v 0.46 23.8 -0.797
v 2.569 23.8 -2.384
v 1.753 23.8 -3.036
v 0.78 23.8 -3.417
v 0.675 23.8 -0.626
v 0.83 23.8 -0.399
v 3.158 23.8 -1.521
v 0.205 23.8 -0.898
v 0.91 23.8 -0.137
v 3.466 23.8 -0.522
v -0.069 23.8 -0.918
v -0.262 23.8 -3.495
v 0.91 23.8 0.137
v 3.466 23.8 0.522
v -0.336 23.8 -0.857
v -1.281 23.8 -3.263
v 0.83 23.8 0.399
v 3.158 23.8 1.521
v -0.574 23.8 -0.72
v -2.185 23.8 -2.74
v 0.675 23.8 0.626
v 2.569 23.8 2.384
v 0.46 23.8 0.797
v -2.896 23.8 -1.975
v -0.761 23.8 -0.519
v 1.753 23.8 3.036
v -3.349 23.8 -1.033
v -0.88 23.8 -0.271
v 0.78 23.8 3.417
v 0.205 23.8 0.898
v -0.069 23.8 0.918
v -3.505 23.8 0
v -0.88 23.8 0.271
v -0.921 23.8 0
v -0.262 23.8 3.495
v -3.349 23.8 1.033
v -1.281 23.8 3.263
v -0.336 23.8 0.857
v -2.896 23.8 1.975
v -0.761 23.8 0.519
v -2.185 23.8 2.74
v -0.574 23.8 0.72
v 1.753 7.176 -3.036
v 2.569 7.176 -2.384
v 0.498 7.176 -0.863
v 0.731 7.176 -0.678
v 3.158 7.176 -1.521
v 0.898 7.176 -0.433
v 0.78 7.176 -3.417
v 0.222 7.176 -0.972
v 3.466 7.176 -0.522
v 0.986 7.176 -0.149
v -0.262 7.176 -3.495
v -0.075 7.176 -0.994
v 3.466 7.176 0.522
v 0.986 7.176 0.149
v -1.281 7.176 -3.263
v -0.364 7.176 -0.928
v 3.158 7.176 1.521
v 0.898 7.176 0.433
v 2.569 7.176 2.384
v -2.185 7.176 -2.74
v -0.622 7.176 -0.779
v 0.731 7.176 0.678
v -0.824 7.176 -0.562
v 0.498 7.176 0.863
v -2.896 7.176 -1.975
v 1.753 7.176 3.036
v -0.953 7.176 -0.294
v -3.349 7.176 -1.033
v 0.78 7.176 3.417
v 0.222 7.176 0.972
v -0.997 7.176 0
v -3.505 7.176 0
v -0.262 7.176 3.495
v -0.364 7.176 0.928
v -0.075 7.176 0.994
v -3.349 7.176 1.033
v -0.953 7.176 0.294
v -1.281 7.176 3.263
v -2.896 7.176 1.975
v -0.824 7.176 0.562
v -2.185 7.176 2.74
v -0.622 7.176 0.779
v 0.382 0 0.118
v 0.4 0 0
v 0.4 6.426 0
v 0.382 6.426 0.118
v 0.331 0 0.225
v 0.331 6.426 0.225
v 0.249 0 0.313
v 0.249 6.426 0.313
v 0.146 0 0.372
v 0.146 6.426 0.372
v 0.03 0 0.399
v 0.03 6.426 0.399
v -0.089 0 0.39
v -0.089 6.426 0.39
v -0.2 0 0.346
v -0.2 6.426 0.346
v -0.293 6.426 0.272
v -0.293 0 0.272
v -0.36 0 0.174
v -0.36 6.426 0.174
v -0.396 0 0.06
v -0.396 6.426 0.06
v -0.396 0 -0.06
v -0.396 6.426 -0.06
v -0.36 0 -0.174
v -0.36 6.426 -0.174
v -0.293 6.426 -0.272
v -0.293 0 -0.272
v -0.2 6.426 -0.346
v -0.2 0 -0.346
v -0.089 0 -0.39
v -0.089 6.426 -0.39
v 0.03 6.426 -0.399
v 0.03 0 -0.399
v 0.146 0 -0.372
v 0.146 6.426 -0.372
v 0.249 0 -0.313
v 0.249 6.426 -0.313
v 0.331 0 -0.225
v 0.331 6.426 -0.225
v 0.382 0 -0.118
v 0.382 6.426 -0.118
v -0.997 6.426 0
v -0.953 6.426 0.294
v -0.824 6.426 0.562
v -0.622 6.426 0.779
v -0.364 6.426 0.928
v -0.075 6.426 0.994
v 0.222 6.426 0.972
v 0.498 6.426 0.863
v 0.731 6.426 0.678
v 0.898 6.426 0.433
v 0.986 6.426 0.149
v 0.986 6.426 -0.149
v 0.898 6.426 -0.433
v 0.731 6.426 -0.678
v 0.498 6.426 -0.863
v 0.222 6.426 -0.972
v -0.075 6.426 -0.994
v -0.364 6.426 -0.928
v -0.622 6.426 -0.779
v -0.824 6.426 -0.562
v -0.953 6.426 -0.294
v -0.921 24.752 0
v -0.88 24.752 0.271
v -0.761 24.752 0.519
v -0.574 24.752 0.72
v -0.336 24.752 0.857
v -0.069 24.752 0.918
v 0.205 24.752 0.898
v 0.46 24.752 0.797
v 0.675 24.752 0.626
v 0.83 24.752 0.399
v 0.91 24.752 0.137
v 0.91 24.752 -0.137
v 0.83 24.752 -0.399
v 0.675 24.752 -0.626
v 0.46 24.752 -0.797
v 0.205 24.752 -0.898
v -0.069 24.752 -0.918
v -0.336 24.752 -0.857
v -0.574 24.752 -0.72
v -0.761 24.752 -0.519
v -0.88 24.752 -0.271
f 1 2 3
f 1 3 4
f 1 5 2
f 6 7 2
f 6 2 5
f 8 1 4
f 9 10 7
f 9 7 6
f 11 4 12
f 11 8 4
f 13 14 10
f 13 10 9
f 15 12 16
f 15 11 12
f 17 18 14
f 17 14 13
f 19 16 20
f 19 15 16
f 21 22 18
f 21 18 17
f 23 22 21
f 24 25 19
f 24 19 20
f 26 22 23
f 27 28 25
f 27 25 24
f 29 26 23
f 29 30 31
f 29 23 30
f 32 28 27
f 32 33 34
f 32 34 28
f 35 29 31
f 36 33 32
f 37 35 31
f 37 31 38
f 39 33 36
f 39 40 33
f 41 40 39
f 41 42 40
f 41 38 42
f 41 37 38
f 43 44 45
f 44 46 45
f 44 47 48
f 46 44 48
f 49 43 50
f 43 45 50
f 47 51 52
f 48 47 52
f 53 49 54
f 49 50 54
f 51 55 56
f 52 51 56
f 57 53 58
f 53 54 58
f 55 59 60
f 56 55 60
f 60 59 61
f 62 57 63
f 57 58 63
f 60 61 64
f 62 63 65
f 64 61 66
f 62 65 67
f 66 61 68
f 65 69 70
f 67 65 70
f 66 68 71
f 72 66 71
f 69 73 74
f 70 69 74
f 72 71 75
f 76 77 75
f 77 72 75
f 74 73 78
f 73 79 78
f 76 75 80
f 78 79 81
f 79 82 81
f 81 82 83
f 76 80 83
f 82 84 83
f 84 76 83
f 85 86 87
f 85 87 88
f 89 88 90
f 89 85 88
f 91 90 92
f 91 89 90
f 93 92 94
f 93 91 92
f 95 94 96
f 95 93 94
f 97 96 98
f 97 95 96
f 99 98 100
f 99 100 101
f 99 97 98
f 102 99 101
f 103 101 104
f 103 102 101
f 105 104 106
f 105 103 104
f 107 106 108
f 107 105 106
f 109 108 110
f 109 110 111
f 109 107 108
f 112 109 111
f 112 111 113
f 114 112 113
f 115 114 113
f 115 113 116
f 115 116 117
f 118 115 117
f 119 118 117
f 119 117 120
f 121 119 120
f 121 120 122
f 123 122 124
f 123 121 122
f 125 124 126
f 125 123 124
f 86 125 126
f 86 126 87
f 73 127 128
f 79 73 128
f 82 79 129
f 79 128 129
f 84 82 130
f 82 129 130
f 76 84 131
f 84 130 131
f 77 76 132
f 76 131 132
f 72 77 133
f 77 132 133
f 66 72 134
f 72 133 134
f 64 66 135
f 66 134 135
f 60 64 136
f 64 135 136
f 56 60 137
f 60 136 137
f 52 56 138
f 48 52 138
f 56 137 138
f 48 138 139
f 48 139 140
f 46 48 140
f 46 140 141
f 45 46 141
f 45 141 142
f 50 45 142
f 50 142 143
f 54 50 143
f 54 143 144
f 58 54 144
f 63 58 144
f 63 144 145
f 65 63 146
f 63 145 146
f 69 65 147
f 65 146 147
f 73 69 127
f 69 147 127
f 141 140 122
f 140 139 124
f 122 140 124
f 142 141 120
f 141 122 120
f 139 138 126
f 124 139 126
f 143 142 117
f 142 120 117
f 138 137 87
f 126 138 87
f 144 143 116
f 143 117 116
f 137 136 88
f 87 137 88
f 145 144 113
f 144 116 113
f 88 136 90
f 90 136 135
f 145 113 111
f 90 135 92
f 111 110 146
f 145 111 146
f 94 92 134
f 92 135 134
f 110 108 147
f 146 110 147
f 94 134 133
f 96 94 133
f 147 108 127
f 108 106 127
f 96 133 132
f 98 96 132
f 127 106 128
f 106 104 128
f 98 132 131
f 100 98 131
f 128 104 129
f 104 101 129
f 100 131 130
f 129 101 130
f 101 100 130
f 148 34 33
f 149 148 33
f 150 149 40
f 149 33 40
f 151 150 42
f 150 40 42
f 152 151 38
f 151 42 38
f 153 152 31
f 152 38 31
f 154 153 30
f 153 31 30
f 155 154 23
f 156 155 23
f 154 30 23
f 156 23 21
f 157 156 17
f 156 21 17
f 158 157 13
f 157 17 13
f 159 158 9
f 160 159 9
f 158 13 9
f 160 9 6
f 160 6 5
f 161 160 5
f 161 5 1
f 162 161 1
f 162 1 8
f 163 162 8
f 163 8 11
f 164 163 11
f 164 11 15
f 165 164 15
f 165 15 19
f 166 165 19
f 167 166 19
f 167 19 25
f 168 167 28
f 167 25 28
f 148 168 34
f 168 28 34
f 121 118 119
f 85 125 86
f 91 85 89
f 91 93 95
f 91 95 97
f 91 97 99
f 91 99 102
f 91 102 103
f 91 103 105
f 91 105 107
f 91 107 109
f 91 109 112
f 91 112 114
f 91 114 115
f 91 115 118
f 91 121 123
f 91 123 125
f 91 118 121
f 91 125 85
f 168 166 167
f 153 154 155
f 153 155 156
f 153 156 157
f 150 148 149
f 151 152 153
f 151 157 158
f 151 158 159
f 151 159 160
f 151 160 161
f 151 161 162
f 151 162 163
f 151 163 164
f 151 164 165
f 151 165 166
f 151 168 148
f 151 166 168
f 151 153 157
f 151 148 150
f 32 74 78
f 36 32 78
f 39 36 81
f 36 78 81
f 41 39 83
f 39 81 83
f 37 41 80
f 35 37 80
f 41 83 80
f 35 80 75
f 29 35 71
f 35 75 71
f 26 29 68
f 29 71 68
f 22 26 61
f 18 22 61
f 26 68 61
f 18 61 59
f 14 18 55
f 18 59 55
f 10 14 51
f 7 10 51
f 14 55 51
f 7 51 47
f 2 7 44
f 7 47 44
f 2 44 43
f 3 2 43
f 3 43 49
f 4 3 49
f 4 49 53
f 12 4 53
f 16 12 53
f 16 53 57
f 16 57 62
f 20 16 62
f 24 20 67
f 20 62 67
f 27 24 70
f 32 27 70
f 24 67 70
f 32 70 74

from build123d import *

# Parameters (mm, degrees)
F0_R     = 0.40005
F1_DEPTH = 6.4262
F2_R     = 0.99695
F2_R_2   = 0.40005
F3_DEPTH = 0.7493
F4_R     = 3.5052
F4_R_2   = 0.99695
F5_DEPTH = 16.6243
F6_R     = 0.92075
F7_DEPTH = 0.9525


with BuildPart() as f1:
    # F0 (on Front) → F1 (new body)
    with BuildSketch(Plane.XZ):
        Circle(F0_R)
    extrude(amount=-F1_DEPTH)

    # F2 (on face) → F3 (join)
    with BuildSketch(Plane(origin=(0, 6.4262, 0), x_dir=(-1, 0, 0), z_dir=(0, 1, 0))):
        Circle(F2_R)
        Circle(F2_R_2, mode=Mode.SUBTRACT)
        Circle(F2_R_2)
    extrude(amount=F3_DEPTH)

    # F4 (on face) → F5 (join)
    with BuildSketch(Plane(origin=(0, 7.1755, 0), x_dir=(-1, 0, 0), z_dir=(0, 1, 0))):
        Circle(F4_R)
        Circle(F4_R_2, mode=Mode.SUBTRACT)
        Circle(F4_R_2)
    extrude(amount=F5_DEPTH)

    # F6 (on face) → F7 (join)
    with BuildSketch(Plane(origin=(0, 23.7998, 0), x_dir=(-1, 0, 0), z_dir=(0, 1, 0))):
        Circle(F6_R)
    extrude(amount=F7_DEPTH)


solid = f1.part
